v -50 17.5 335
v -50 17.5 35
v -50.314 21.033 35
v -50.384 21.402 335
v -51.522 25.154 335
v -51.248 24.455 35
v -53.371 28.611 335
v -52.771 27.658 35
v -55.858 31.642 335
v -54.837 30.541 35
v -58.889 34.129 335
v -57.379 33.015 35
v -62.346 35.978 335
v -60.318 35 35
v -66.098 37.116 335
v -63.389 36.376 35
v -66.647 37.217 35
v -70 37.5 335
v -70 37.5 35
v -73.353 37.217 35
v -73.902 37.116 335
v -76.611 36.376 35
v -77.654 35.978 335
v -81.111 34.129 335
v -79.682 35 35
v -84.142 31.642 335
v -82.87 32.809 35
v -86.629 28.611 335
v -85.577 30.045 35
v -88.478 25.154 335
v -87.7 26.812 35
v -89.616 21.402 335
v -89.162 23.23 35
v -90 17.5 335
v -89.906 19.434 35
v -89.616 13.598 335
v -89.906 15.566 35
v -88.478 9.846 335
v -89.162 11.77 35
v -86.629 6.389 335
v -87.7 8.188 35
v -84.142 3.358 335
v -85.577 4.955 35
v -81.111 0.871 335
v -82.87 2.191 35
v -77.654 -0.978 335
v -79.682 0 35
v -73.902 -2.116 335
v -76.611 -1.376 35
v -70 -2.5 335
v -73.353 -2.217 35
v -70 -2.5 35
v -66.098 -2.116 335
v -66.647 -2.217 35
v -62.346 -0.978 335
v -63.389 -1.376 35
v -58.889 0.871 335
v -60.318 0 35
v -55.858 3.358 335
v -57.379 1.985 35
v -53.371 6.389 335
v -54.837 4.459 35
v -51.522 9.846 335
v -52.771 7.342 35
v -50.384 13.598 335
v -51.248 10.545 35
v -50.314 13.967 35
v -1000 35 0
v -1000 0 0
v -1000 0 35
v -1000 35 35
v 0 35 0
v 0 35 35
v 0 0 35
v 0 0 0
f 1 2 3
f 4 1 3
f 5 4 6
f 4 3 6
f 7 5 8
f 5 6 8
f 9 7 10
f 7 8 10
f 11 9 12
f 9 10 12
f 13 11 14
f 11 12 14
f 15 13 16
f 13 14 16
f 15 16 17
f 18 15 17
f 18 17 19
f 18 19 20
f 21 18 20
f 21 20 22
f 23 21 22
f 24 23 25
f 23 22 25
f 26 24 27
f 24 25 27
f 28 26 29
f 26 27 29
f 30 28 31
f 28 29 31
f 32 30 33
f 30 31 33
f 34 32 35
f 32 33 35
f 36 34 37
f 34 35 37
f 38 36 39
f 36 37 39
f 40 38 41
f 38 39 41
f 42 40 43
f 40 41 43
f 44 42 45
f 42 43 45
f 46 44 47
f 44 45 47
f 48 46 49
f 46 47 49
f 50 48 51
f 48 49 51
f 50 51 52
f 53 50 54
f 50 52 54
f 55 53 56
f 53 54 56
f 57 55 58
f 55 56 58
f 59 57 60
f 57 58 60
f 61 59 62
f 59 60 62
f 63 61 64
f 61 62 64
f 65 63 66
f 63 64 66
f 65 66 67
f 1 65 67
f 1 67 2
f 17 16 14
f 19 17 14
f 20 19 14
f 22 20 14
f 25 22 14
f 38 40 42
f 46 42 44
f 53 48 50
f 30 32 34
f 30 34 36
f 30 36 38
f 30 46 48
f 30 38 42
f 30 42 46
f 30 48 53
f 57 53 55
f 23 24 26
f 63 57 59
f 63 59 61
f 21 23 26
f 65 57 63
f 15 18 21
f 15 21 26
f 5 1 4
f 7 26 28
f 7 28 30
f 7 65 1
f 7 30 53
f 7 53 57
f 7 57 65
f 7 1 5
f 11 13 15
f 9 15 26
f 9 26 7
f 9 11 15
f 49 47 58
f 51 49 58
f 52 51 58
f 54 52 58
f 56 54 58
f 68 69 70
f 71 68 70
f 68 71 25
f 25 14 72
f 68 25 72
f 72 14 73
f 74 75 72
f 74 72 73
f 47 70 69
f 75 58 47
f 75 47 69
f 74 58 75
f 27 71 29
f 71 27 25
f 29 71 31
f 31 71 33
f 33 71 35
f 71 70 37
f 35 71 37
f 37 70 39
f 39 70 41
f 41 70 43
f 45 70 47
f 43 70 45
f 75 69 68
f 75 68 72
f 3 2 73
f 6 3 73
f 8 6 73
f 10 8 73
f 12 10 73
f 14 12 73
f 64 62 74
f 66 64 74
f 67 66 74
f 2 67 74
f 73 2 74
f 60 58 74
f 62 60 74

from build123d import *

# Parameters (mm, degrees)
F0_W     = 1000
F0_H     = 35
F1_DEPTH = 35
F2_R     = 20
F3_DEPTH = 300


with BuildPart() as f1:
    # F0 (on Front) → F1 (new body)
    with BuildSketch(Plane.XZ):
        with Locations((-500, 17.5)):
            Rectangle(F0_W, F0_H)
    extrude(amount=-F1_DEPTH)

    # F2 (on face) → F3 (join)
    with BuildSketch(Plane.XY.offset(35)):
        with Locations((-70, 17.5)):
            Circle(F2_R)
    extrude(amount=F3_DEPTH)


solid = f1.part
